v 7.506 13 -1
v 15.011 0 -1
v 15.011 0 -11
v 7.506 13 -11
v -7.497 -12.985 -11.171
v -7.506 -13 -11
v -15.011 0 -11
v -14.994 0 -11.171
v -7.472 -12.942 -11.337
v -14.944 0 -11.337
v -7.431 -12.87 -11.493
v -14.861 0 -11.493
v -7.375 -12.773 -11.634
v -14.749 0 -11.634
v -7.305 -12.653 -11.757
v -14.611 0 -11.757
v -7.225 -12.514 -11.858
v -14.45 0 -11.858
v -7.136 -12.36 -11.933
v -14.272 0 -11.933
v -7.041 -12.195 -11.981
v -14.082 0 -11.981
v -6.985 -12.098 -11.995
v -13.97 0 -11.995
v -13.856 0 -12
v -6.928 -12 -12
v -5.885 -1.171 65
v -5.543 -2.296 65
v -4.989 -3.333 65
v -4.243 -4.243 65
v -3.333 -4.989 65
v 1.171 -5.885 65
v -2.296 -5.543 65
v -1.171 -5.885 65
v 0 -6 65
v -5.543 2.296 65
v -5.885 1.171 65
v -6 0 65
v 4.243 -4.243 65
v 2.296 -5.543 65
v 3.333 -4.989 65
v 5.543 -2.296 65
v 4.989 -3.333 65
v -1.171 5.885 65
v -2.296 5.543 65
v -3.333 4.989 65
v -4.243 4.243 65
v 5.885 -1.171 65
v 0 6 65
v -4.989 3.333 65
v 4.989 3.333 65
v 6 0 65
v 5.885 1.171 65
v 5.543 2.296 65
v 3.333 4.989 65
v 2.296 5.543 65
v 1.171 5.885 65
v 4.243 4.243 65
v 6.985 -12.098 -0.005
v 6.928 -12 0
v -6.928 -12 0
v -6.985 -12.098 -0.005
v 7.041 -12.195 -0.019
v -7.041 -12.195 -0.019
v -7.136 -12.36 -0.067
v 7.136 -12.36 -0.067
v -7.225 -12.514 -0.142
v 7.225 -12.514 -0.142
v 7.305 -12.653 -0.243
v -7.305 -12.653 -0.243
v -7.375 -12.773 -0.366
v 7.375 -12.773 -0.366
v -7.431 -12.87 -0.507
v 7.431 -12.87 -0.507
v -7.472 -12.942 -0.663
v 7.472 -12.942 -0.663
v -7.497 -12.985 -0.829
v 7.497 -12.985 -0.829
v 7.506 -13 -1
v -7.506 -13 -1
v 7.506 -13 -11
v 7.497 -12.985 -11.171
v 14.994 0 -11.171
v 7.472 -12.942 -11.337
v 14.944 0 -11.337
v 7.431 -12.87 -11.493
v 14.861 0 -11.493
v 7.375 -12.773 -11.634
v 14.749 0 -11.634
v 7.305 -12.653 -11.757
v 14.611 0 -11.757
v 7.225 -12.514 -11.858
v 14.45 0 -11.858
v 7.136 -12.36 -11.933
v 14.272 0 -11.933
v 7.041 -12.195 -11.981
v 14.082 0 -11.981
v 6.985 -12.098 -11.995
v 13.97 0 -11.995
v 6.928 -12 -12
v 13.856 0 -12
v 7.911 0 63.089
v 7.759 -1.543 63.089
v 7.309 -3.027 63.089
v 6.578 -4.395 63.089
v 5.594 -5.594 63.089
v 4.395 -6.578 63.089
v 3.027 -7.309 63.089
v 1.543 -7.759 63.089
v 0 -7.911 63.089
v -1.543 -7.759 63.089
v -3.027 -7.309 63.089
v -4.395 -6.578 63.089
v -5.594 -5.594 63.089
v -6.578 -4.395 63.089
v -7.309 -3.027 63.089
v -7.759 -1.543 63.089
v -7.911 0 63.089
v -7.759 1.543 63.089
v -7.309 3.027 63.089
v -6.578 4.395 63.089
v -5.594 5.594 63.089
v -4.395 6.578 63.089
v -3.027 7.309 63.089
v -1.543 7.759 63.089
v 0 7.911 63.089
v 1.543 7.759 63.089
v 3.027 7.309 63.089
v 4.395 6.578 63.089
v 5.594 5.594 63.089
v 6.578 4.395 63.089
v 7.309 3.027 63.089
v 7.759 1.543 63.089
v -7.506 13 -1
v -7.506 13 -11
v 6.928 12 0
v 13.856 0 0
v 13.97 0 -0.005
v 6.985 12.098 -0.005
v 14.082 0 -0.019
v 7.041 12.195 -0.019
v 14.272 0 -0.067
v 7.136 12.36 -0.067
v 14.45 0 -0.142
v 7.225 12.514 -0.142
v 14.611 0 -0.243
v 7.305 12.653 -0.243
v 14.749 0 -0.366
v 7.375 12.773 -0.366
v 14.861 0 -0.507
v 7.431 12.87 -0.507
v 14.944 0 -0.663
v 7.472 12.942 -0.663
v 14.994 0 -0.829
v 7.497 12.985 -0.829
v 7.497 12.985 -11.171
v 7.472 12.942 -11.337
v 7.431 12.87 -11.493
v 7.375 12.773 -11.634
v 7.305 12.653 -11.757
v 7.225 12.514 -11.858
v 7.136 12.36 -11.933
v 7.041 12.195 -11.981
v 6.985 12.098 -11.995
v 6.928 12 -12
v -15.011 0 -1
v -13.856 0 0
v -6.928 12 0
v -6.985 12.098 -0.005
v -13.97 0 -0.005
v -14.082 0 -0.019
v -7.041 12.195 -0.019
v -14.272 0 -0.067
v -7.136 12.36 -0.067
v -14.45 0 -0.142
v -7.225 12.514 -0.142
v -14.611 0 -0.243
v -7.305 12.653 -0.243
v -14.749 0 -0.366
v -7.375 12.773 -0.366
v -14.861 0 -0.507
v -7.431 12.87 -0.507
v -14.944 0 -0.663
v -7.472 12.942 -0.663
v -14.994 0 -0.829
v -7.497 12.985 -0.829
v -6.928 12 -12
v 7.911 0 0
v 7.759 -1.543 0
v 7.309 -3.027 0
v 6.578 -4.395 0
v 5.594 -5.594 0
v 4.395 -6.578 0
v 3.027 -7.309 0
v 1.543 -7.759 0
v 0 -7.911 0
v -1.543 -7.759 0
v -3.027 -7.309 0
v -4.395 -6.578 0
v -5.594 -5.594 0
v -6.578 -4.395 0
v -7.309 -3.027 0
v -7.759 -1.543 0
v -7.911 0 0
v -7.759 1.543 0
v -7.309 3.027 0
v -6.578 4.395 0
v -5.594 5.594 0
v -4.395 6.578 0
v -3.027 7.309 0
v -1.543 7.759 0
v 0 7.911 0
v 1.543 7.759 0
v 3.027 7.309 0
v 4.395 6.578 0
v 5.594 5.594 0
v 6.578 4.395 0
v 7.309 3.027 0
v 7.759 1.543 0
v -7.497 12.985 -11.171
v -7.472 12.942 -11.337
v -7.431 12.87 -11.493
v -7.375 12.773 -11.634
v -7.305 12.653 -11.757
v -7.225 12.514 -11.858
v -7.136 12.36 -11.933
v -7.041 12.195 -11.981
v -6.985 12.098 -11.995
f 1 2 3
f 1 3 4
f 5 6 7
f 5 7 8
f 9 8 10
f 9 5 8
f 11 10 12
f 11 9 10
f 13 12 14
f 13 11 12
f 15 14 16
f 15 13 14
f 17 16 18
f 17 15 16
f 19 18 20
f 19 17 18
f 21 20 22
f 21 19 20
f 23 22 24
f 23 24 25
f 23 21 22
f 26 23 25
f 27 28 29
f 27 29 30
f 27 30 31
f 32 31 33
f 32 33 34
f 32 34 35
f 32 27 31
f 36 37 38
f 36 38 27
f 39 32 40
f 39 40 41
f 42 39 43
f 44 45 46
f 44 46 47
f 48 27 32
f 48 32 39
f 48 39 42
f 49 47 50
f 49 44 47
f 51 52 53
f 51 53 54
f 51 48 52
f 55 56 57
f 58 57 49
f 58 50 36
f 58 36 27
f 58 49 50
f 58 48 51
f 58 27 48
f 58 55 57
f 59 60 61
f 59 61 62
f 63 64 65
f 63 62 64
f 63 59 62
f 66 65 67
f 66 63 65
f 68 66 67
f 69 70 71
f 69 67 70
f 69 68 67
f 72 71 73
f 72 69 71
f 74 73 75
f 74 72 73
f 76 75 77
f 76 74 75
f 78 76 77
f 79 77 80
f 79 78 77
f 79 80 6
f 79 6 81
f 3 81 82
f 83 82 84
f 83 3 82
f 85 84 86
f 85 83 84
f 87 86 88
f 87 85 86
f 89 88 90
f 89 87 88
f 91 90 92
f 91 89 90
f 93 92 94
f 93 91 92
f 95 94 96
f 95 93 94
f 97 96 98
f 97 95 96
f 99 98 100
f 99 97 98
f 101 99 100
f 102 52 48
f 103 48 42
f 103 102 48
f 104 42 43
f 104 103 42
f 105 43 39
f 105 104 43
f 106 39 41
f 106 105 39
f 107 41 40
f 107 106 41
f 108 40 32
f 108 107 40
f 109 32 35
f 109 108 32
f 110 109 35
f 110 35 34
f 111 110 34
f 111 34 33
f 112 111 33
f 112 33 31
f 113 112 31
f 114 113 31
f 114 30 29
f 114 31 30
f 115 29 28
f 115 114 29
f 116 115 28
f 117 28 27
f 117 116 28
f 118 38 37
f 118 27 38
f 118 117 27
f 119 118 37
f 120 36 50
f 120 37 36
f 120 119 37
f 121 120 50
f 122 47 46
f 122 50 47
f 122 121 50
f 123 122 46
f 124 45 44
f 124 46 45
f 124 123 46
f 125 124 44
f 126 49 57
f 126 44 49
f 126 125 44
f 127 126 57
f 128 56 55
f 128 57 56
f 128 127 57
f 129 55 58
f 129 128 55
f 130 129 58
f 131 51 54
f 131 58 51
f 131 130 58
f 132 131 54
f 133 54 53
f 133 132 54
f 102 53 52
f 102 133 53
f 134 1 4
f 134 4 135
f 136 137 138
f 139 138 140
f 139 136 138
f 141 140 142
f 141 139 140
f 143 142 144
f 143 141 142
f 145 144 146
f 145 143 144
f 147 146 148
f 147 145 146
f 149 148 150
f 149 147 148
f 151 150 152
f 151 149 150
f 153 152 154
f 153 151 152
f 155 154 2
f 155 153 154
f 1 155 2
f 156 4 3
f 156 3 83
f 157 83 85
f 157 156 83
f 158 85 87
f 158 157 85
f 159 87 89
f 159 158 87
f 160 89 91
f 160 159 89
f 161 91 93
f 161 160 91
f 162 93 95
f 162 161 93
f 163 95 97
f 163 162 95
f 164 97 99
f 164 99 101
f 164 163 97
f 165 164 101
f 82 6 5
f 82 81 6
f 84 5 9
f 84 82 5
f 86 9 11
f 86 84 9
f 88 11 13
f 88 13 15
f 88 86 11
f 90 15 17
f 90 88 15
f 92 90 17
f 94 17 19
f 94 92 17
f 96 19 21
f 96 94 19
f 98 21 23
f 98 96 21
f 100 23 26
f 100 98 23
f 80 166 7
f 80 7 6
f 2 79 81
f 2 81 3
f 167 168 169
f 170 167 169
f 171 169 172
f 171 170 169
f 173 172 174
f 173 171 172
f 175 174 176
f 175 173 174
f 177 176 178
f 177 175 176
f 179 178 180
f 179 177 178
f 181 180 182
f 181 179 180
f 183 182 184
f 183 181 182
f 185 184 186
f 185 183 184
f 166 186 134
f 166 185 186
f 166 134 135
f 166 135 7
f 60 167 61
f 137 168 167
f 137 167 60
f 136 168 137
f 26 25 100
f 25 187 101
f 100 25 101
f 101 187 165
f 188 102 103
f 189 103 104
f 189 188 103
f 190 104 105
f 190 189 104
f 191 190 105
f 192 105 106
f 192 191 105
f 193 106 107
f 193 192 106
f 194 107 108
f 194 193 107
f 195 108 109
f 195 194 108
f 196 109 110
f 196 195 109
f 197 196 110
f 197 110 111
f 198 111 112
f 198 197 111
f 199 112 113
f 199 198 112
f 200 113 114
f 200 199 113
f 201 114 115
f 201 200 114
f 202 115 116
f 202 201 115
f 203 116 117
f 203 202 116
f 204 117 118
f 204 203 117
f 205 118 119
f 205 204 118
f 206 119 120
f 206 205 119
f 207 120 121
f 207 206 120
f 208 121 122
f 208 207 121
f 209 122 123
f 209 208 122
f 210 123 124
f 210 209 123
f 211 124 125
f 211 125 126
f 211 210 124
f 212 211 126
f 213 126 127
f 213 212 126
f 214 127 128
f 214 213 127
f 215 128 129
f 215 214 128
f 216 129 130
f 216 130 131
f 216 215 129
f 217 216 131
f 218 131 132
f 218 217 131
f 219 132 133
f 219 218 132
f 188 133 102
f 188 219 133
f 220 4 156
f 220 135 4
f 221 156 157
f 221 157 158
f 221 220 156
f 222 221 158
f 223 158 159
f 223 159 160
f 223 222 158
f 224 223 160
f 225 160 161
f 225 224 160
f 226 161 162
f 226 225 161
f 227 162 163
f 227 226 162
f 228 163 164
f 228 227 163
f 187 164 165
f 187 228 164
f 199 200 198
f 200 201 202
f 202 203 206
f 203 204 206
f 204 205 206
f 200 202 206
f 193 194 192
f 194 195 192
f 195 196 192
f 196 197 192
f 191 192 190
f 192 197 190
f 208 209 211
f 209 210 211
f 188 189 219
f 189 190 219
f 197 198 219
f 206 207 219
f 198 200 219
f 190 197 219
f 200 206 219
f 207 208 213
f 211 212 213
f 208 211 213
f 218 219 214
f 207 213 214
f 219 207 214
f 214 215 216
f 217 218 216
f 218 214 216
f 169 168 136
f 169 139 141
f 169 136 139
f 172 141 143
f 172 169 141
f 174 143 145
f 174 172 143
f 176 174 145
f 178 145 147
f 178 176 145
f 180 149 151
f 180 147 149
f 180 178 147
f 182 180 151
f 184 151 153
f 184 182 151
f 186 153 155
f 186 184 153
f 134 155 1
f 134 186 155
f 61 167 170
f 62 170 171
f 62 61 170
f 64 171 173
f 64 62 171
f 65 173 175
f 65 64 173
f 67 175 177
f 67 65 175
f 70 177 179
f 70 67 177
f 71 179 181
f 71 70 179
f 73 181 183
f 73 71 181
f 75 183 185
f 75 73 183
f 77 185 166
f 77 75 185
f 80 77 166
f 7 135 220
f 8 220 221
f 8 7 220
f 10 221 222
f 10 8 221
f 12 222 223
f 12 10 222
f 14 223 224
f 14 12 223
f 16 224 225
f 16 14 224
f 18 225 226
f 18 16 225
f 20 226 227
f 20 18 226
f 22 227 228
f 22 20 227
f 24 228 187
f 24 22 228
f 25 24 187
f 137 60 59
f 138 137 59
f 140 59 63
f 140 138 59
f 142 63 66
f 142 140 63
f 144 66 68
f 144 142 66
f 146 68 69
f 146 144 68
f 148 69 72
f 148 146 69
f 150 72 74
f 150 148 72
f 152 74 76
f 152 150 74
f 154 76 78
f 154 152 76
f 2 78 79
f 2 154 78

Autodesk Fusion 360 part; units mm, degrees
sketch "Sketch1" plane through (0, 0, 0) normal (0, 0, 1) x (1, 0, 0)
  circle A0 centre (0, 0) radius 8
  line L0 (0, 0) -> (0, 8) construction
  line L1 (0, 0) -> (-8, 0) construction
  line L2 (0, 0) -> (8, 0) construction
  line L3 (0, 0) -> (0, -8) construction
  line L4 (-4.6188, 8) -> (-9.2376, 0) construction
  line L5 (-9.2376, 0) -> (-4.6188, -8) construction
  line L6 (-4.6188, -8) -> (4.6188, -8) construction
  line L7 (4.6188, -8) -> (9.2376, 0) construction
  line L8 (9.2376, 0) -> (4.6188, 8) construction
  line L9 (4.6188, 8) -> (-4.6188, 8) construction
  line L10 (-7.5056, -13) -> (7.5056, -13)
  line L11 (7.5056, -13) -> (15.0111, 0)
  line L12 (15.0111, 0) -> (7.5056, 13)
  line L13 (7.5056, 13) -> (-7.5056, 13)
  line L14 (-7.5056, 13) -> (-15.0111, 0)
  line L15 (-15.0111, 0) -> (-7.5056, -13)
  dimension "d1" = 16
  dimension "d4" = 5
extrude "Extrude1" add sketch "Sketch1" along normal blind 65 contours A0 makes body 1
extrude "Extrude2" add sketch "Sketch1" against normal blind 12 separate body contours A0 | L10 L11 L12 L13 L14 L15 makes body 2
chamfer "Chamfer1" distance 2 angle 45 1 edges at (-7.4586, -2.8929, 65) on bodies 1
fillet "Fillet1" radius 1 12 edges at (0, 13, 0) (11.2583, 6.5, 0) (0, 13, -12) (11.2583, 6.5, -12) (11.2583, -6.5, 0) (11.2583, -6.5, -12) (0, -13, 0) (0, -13, -12) (-11.2583, -6.5, 0) (-11.2583, -6.5, -12) (-11.2583, 6.5, 0) (-11.2583, 6.5, -12) on bodies 2
thread "Thread1" "ISO Metric profile 16.0 M16x2 6g" major diameter 15.822 minor diameter 13.534 pitch 2 angle 60 resizes the face on face at (7.9901, -0.3988, 42) on bodies 1
